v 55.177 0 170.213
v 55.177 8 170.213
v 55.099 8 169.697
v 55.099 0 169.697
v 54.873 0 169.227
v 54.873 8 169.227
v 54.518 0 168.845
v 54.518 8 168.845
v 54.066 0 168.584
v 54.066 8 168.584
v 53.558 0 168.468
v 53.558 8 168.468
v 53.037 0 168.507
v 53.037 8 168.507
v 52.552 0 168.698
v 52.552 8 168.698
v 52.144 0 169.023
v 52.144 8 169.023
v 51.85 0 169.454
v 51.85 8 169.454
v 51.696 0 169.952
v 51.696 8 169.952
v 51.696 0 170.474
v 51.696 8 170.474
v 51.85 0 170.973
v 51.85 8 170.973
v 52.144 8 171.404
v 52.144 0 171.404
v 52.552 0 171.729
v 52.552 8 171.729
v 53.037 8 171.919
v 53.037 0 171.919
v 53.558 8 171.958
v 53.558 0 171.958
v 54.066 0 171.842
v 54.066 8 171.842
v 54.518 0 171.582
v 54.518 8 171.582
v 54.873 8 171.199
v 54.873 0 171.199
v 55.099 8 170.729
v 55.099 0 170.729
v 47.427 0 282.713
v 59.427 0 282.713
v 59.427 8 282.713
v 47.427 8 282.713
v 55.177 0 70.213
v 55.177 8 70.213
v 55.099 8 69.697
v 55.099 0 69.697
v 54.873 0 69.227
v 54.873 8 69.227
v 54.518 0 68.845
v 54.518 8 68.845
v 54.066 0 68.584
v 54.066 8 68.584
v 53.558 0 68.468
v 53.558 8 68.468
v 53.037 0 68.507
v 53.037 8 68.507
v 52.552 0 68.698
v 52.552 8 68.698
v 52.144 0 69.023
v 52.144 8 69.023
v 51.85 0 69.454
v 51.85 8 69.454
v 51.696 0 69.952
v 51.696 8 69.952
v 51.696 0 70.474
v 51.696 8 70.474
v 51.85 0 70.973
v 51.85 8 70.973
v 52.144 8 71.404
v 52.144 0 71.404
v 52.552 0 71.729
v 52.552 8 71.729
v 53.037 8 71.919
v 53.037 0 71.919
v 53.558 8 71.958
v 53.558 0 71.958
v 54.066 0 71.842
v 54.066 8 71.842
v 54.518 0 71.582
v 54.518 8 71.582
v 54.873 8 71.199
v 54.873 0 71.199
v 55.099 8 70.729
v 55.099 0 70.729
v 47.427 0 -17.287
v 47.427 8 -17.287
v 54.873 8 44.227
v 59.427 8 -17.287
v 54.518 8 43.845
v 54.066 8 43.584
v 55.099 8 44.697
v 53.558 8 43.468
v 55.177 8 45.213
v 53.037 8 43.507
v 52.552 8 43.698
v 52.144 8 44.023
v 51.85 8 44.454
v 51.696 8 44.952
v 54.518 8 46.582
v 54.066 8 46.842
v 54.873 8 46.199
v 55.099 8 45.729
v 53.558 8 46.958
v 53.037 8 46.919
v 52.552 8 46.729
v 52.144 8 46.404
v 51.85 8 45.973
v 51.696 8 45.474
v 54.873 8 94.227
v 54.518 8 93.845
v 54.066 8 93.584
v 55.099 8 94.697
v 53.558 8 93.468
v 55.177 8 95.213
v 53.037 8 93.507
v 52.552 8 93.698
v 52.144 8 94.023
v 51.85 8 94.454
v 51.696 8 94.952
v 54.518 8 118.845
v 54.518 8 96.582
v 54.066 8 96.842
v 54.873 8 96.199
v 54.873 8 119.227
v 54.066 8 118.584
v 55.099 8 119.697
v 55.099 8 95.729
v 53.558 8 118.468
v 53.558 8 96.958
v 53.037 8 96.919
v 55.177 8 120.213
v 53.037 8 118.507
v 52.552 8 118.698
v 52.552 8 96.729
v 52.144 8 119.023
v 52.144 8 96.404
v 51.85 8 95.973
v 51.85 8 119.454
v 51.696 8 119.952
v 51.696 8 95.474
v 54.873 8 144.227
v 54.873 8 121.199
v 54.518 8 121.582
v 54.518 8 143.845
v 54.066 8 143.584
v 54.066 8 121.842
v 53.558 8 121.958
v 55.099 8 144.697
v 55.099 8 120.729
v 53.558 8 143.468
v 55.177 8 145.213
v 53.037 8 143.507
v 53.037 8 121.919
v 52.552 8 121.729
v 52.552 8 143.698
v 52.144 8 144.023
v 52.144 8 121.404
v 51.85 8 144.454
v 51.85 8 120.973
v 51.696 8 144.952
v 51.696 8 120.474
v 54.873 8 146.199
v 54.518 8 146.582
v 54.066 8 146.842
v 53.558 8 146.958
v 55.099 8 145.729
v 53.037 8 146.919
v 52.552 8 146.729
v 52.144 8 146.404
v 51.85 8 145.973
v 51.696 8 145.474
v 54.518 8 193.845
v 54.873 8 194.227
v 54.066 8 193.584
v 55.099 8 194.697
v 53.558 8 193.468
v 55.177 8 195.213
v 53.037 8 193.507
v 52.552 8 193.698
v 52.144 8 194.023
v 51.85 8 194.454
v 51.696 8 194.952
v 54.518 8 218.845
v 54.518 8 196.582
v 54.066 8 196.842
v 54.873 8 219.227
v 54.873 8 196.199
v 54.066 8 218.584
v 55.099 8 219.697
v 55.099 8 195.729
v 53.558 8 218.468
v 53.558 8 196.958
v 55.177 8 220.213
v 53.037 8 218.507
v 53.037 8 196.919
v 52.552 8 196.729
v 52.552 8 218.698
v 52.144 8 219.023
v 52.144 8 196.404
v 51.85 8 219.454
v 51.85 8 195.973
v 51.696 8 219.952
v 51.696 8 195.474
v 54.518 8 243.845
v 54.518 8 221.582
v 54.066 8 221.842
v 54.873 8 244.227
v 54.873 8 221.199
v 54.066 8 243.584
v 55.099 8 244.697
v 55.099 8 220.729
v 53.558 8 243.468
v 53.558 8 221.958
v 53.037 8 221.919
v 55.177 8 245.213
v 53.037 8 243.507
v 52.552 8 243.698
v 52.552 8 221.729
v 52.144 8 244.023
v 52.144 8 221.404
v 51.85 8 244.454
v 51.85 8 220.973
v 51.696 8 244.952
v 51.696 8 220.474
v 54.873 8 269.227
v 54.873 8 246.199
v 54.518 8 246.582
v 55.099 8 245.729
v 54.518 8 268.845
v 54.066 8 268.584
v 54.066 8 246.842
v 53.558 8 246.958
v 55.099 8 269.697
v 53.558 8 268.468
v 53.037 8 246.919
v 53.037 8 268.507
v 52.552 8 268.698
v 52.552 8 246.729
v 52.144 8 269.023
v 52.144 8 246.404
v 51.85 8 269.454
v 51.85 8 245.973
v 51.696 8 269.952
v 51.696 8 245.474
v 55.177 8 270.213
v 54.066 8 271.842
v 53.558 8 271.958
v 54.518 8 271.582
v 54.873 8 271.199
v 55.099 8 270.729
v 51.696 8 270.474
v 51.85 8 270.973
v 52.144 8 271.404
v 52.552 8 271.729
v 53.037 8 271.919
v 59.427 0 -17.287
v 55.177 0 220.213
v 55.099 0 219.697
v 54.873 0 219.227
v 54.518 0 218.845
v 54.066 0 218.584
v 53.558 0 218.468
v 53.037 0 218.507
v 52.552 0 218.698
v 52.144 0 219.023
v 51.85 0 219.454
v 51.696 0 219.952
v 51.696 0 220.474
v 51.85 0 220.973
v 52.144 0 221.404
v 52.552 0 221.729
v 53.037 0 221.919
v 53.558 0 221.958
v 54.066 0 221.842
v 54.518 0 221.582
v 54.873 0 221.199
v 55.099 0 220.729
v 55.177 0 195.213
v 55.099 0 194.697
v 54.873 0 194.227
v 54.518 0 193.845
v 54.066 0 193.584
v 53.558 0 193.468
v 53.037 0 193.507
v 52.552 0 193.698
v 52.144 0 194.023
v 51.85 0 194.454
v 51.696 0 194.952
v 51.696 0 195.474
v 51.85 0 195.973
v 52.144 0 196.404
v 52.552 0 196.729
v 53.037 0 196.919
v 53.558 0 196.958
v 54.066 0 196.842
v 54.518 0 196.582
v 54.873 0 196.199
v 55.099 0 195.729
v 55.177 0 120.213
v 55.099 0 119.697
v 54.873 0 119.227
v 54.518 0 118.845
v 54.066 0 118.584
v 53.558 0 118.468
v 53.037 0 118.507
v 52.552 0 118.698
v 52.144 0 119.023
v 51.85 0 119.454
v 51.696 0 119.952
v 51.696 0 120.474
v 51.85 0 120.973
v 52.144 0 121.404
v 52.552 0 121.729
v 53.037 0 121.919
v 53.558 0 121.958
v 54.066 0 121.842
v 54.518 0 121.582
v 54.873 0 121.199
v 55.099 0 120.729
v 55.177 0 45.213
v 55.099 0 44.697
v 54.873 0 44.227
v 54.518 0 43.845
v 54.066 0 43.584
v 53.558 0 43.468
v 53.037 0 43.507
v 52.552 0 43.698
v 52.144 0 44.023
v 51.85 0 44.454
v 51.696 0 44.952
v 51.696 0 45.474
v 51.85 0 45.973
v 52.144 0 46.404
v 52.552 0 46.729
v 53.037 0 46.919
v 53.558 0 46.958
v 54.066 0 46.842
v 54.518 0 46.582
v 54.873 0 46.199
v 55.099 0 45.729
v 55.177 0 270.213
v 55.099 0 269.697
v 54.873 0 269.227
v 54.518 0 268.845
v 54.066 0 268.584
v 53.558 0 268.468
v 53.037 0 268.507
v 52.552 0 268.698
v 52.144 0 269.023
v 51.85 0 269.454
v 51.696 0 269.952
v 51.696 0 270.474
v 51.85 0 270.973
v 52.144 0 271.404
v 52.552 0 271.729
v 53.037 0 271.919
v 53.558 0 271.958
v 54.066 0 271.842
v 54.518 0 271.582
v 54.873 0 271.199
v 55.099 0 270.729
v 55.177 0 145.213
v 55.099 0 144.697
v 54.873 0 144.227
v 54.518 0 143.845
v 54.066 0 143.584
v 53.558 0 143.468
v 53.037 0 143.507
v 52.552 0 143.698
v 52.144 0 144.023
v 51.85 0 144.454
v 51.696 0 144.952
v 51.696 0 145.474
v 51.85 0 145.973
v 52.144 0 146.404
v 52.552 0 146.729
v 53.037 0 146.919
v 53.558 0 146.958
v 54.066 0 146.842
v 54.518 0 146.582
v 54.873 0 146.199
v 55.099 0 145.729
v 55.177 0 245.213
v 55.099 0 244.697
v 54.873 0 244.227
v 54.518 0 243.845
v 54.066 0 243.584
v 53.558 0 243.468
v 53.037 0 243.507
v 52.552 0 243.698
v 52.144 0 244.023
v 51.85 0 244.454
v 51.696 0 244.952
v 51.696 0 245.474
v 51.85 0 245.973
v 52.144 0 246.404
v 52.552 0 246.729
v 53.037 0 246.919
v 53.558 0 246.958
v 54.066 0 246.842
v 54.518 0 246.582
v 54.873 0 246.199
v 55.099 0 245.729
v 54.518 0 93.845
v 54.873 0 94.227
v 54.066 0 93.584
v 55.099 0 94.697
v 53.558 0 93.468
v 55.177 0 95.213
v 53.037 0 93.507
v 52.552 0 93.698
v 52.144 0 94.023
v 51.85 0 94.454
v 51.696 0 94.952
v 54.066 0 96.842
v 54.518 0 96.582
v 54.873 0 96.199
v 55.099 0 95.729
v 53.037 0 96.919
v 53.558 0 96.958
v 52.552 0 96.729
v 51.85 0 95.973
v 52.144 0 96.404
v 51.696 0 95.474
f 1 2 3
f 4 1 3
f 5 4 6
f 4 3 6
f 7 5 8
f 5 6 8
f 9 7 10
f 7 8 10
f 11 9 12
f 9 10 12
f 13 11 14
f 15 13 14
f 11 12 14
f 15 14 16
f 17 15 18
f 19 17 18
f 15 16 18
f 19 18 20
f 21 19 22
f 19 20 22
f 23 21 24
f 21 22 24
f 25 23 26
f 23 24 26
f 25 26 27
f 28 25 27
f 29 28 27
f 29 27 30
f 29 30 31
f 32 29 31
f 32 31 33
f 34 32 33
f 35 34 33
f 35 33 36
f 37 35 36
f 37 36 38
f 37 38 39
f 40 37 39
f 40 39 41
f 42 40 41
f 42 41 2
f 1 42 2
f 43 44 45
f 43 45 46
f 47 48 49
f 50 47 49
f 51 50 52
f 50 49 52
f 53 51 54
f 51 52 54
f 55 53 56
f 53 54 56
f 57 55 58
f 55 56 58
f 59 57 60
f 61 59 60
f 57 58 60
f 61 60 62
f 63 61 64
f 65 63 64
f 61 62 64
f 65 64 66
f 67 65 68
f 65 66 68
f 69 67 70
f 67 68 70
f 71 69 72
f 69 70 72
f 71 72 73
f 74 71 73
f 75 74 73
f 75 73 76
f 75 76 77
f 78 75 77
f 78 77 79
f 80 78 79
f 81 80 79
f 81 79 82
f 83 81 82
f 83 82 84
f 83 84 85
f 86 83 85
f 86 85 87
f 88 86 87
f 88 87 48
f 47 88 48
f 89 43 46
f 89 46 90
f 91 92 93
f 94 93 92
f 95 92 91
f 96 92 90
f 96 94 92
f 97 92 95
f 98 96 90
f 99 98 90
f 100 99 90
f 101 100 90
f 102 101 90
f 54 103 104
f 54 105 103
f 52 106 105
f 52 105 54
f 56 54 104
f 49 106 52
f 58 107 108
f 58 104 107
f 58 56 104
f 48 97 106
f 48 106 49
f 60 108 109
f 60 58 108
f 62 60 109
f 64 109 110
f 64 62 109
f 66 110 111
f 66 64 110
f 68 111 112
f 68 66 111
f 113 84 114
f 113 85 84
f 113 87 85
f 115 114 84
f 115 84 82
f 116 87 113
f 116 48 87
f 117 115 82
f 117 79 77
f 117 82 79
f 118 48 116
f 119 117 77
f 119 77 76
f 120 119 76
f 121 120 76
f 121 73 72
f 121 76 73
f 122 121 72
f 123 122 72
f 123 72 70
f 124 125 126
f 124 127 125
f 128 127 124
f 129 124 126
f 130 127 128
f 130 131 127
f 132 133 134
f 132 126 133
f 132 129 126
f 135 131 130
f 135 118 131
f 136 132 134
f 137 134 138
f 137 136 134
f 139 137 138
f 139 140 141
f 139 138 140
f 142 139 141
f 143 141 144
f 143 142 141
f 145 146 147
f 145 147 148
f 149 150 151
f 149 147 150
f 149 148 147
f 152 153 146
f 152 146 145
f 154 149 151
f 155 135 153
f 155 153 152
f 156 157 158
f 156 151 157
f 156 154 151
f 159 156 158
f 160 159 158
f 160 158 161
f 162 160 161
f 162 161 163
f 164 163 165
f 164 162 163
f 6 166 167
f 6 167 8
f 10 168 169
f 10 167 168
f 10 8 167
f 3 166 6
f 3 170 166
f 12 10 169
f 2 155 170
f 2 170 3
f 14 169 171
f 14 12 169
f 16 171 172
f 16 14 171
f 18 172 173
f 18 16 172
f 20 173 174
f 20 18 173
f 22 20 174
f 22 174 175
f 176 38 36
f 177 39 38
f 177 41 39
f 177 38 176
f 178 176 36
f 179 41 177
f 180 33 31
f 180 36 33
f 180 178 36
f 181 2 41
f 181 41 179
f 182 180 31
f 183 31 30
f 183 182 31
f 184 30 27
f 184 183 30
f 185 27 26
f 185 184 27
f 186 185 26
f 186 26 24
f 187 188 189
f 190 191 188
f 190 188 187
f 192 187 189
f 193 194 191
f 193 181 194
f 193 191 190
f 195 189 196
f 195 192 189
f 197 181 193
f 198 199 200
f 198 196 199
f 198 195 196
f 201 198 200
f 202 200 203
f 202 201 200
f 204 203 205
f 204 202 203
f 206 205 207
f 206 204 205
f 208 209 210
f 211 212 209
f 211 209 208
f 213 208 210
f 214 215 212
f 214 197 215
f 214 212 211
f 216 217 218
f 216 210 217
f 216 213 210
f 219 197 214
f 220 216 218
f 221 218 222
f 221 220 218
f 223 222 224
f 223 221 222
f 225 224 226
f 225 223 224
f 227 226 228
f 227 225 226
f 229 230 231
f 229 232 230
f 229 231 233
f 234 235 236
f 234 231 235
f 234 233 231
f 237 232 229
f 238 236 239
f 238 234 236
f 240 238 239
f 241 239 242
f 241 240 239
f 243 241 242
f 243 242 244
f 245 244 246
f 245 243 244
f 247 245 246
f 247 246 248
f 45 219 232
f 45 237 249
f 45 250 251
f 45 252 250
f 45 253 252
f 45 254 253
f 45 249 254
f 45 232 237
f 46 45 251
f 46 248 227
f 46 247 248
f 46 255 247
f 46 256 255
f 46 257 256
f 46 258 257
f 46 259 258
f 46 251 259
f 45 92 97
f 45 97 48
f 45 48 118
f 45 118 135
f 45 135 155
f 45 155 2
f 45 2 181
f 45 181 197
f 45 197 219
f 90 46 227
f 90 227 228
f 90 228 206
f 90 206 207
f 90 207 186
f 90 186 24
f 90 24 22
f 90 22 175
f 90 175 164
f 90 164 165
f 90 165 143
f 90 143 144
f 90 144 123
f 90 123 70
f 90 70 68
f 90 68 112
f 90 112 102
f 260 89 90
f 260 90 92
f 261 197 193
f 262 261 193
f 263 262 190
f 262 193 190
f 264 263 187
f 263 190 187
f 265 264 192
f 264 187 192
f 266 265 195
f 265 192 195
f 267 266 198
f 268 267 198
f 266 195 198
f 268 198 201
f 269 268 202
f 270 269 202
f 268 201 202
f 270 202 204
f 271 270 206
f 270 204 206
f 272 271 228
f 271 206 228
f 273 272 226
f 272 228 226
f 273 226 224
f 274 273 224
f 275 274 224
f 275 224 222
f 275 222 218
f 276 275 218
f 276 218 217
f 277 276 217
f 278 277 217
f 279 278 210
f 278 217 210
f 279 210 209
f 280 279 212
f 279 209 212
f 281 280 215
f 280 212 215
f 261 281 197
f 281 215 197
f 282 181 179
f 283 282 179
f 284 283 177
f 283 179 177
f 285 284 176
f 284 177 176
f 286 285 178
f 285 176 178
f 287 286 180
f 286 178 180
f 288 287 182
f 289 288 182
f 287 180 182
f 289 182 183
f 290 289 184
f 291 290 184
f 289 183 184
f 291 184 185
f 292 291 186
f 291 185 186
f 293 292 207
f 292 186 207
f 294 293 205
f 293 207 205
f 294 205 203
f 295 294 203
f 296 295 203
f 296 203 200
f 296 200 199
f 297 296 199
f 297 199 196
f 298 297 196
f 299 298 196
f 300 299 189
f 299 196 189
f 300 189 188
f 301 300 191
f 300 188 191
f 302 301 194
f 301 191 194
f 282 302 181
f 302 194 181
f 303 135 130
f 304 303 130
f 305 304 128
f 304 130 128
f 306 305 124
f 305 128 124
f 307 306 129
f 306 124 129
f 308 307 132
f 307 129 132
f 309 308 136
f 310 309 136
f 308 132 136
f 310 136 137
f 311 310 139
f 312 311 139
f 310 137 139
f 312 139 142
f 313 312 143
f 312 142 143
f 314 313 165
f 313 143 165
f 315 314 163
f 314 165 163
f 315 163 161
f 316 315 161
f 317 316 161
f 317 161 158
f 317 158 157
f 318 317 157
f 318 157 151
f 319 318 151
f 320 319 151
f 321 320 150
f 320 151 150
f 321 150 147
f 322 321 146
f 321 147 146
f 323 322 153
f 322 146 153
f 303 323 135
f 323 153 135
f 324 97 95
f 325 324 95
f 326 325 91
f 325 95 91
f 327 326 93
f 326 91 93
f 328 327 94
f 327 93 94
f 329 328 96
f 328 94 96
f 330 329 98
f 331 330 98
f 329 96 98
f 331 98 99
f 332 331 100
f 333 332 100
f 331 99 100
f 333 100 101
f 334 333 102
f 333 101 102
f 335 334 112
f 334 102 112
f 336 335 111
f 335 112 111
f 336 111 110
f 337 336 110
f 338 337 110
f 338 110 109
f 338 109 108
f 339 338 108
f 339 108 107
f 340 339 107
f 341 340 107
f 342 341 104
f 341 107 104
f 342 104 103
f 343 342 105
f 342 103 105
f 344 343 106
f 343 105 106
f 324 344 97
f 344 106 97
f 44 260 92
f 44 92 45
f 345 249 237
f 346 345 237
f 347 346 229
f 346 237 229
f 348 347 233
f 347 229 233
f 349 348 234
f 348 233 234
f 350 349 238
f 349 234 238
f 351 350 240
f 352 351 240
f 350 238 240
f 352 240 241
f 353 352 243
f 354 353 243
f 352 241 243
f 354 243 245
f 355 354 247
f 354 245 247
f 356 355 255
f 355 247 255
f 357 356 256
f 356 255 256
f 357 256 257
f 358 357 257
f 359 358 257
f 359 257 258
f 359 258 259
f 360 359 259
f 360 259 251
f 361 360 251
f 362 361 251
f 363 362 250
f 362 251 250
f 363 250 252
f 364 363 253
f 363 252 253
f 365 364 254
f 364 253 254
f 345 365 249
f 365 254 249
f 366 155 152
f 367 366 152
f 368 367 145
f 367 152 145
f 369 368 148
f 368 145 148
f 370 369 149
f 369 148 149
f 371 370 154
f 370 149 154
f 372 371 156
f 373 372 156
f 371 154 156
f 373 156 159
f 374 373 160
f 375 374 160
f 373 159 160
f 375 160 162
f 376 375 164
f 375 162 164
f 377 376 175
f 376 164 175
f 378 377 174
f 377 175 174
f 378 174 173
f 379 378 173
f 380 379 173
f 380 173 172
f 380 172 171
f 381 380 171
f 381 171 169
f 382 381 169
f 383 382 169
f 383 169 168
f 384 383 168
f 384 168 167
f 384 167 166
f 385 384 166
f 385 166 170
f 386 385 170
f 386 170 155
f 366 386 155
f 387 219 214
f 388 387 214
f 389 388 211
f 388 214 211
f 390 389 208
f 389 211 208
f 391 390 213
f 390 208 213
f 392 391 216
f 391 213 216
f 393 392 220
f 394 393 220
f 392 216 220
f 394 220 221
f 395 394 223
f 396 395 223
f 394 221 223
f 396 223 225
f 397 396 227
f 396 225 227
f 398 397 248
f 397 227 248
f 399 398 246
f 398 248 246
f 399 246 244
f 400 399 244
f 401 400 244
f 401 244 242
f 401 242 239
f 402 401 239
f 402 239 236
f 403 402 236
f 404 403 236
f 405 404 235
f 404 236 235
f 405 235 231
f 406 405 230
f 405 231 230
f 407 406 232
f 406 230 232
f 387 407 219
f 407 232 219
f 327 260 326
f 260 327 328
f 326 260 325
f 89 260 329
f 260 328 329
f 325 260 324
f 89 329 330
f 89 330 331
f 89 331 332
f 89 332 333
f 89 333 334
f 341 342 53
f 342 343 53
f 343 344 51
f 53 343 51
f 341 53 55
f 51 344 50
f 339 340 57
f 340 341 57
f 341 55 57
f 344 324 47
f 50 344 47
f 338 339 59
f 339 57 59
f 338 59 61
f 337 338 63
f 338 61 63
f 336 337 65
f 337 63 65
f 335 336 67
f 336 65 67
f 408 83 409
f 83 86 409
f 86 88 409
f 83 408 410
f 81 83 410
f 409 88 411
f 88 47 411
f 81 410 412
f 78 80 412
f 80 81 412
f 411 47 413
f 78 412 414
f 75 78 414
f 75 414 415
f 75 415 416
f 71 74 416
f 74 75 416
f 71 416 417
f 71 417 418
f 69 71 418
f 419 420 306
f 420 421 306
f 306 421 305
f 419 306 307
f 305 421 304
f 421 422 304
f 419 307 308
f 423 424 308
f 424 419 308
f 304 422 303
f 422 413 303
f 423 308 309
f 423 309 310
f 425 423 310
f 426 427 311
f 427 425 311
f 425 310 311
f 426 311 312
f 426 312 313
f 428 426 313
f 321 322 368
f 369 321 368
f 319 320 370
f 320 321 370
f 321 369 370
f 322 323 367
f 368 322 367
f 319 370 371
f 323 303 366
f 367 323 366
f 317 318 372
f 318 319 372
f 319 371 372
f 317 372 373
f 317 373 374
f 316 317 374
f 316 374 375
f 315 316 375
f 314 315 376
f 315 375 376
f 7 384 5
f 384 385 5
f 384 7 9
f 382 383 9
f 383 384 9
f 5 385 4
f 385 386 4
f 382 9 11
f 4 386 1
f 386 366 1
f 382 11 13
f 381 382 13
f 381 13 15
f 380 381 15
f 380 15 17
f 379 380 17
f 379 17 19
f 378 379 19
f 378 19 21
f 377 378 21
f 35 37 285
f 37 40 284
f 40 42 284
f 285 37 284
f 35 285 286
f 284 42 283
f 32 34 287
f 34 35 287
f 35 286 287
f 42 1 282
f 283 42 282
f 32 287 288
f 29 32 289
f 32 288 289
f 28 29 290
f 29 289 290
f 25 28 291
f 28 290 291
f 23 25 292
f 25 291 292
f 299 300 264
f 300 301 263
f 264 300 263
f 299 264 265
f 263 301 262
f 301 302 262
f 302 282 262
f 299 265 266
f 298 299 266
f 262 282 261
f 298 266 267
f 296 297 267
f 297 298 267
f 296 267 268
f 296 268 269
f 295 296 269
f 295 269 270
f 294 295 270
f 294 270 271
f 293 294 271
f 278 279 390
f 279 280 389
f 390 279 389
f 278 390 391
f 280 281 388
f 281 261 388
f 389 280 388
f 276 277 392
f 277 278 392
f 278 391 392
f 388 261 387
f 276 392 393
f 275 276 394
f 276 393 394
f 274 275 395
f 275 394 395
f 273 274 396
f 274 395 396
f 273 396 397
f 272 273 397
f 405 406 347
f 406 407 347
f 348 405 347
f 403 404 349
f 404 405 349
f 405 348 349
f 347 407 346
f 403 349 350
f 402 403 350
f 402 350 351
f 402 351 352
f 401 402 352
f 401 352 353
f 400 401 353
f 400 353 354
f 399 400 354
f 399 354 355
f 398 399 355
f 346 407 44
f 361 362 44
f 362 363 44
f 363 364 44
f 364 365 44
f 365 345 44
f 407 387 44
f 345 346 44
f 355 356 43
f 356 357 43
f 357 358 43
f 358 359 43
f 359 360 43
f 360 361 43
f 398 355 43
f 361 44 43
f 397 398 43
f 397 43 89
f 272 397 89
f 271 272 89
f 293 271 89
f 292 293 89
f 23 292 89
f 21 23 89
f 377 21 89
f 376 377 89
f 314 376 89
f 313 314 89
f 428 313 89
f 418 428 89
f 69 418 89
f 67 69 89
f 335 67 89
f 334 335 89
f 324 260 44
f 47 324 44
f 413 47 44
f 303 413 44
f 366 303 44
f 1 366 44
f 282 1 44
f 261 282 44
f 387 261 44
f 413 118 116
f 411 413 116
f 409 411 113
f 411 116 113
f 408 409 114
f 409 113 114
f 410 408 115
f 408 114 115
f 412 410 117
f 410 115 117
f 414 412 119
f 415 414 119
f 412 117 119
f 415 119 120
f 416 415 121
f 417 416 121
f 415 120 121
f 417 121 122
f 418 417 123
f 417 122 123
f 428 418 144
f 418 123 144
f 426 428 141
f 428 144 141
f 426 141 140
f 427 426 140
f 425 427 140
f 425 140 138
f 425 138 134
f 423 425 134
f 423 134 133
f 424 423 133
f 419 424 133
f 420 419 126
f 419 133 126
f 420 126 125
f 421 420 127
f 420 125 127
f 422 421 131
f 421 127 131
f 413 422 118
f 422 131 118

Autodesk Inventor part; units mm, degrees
ref_plane "YZ Plane" through (0, 0, 0) normal (1, 0, 0) x (0, 1, 0)
ref_plane "XZ Plane" through (0, 0, 0) normal (0, 1, 0) x (-1, 0, 0)
ref_plane "XY Plane" through (0, 0, 0) normal (0, 0, 1) x (1, 0, 0)
sketch "Sketch1" plane through (0, 0, 0) normal (0, 1, 0) x (-1, 0, 0)
  line L0 (-47.4268, -17.2867) -> (-59.4268, -17.2867)
  line L1 (-59.4268, -17.2867) -> (-59.4268, 282.7133)
  line L2 (-59.4268, 282.7133) -> (-47.4268, 282.7133)
  line L3 (-47.4268, 282.7133) -> (-47.4268, -17.2867)
  point P0 (0, 0)
  dimension "d0" = 300
  dimension "d1" = 12
extrude "Extrusion1" add sketch "Sketch1" along normal blind 8
sketch "Sketch2" plane through (0, 8, 0) normal (0, 1, 0) x (1, 0, 0)
  circle A0 centre (53.4268, -270.2133) radius 1.75
  line L0 (59.4268, -282.7133) -> (59.4268, 17.2867) projected
  line L1 (47.4268, -282.7133) -> (59.4268, -282.7133) projected
  circle A1 centre (53.4268, -245.2133) radius 1.75
  circle A2 centre (53.4268, -220.2133) radius 1.75
  circle A3 centre (53.4268, -195.2133) radius 1.75
  circle A4 centre (53.4268, -170.2133) radius 1.75
  circle A5 centre (53.4268, -145.2133) radius 1.75
  circle A6 centre (53.4268, -120.2133) radius 1.75
  circle A7 centre (53.4268, -95.2133) radius 1.75
  circle A8 centre (53.4268, -70.2133) radius 1.75
  circle A9 centre (53.4268, -45.2133) radius 1.75
  point P0 (0, 0)
  dimension "d4" = 3.5
  dimension "d5" = 6
  dimension "d6" = 12.5
  dimension "d9" = 25
extrude "Extrusion2" cut sketch "Sketch2" against normal through all
properties part number "MGN12H_rail" material "Stainless Steel"
